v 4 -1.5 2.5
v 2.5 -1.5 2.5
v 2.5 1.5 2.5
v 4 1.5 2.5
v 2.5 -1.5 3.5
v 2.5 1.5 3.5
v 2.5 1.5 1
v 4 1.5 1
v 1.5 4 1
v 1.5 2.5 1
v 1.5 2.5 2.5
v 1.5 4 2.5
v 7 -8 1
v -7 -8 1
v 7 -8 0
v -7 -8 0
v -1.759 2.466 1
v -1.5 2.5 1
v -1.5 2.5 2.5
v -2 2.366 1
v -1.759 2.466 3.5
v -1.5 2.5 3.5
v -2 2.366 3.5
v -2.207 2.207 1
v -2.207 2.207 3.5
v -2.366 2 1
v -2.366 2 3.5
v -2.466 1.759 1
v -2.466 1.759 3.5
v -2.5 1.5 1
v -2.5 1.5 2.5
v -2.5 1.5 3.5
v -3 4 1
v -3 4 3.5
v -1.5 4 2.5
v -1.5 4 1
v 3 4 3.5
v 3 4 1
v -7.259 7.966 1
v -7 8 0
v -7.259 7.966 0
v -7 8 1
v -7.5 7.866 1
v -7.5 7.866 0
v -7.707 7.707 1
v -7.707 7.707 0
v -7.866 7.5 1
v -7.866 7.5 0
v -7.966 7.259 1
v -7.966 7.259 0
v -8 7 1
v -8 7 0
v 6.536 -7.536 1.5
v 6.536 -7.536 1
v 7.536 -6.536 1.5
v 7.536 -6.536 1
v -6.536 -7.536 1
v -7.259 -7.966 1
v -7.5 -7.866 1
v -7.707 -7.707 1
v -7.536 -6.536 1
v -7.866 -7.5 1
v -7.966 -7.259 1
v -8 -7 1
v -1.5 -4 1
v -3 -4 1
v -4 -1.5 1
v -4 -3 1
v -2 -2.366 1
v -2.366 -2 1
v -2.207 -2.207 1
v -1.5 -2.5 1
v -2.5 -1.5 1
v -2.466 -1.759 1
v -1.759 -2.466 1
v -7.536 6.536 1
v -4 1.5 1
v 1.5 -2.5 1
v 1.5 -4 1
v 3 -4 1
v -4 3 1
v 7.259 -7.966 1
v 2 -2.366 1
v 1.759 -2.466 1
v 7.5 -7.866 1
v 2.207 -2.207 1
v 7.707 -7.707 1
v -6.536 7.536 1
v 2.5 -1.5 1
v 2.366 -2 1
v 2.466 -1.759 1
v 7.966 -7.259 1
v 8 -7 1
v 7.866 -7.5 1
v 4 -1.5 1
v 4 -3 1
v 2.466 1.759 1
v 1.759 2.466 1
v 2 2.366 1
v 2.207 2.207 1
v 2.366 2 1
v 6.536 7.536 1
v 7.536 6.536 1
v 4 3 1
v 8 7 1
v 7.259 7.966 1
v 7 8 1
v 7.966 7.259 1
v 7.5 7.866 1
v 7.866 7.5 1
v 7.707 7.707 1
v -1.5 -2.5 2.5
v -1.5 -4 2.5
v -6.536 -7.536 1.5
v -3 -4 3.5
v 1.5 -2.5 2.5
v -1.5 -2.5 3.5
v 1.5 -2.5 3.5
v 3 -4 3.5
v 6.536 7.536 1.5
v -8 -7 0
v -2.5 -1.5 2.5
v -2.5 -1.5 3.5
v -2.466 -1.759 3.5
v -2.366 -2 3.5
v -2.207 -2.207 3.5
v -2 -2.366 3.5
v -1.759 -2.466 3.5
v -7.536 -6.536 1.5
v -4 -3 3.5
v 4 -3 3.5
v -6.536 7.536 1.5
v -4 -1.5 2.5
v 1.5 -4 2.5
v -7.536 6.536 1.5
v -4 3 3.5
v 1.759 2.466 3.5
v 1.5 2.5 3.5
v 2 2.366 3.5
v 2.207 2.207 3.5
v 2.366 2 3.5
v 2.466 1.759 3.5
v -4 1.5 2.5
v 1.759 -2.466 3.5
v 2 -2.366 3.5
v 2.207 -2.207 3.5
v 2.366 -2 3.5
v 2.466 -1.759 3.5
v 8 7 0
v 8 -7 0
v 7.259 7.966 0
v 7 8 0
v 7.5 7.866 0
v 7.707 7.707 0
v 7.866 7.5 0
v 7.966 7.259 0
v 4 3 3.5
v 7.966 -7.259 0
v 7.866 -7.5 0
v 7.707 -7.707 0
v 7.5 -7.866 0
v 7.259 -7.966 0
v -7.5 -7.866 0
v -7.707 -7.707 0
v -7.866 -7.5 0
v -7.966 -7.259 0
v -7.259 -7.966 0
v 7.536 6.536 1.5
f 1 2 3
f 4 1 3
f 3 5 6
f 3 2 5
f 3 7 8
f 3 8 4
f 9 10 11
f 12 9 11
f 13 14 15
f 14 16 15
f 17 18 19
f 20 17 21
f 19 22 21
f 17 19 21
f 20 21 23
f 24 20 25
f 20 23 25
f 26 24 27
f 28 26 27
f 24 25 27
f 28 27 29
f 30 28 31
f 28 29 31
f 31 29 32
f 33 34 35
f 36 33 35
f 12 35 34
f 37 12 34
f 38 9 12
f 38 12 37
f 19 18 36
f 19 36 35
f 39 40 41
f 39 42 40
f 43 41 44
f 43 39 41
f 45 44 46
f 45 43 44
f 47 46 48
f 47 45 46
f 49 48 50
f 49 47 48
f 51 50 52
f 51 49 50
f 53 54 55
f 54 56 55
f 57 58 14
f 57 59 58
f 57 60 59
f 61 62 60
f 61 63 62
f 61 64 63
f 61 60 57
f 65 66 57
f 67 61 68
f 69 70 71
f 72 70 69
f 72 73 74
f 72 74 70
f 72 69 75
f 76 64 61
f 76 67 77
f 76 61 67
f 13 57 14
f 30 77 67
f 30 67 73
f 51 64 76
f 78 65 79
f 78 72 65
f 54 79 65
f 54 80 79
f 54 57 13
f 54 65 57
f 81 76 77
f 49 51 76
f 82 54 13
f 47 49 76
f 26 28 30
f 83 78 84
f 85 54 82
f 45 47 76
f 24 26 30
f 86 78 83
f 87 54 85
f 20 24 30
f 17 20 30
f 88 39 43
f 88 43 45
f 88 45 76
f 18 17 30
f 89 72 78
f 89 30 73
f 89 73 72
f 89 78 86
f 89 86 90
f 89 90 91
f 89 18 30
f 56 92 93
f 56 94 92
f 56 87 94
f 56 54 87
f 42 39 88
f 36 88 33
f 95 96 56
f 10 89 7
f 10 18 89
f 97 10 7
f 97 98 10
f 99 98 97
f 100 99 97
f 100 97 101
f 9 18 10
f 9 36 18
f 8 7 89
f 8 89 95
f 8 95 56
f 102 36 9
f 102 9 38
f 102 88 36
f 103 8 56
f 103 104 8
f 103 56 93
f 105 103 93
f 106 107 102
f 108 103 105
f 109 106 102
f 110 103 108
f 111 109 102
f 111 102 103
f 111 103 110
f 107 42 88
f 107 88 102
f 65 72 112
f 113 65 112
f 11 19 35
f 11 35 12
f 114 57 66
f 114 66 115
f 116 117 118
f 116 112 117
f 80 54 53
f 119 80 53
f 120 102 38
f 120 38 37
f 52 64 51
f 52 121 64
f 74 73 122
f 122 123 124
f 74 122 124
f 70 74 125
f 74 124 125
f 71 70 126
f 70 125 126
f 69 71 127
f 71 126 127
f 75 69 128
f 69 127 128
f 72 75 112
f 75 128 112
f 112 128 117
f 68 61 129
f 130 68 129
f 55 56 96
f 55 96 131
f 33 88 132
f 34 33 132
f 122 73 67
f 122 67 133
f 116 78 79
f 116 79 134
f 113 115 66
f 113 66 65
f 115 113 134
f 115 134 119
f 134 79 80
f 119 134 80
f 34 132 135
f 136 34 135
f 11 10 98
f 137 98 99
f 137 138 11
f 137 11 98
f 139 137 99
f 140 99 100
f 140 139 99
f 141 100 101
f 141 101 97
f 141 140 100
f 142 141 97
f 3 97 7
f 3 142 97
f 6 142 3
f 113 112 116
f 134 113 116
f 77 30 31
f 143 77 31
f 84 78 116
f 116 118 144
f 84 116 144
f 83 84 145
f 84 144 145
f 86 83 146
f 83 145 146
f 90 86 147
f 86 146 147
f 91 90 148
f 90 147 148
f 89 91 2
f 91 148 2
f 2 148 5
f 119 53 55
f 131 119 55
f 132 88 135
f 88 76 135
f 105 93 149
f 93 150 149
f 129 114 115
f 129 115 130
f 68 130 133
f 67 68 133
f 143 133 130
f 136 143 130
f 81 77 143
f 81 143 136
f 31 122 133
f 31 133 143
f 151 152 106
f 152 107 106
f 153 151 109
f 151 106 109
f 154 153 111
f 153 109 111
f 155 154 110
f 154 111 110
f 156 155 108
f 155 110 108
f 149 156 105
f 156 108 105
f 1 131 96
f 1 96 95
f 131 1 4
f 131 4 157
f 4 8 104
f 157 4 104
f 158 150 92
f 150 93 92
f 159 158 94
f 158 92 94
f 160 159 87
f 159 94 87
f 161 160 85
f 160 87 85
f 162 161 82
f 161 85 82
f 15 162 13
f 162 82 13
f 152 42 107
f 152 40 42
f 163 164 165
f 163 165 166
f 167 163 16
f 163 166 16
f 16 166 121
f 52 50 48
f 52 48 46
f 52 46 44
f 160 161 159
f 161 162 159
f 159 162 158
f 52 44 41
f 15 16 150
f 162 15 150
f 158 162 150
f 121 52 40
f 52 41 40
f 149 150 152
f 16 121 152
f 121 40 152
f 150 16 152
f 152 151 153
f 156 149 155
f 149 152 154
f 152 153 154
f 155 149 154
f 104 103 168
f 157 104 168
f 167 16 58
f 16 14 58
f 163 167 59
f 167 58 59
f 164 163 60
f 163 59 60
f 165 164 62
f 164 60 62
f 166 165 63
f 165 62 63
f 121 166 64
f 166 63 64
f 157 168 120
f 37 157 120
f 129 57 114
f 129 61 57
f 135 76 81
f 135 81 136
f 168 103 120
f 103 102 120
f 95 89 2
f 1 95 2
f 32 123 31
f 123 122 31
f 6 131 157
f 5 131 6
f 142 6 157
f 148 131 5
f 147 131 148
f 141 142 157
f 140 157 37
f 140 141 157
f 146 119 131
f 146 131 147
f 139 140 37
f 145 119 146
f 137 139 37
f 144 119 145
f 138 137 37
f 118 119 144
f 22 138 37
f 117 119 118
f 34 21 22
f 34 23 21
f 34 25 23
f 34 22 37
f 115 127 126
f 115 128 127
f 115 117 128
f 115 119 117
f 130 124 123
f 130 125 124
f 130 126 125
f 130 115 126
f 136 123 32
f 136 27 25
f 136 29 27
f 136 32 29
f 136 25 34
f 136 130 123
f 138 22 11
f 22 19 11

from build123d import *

# Parameters (mm, degrees)
F0_W           = 16
F0_H           = 16
F1_DEPTH       = 1
F2_W           = 8
F2_H           = 8
F2_W_2         = 5
F2_H_2         = 5
F3_DEPTH       = 2.5
F4_SIZE        = 1
F5_DEPTH       = 5
F6_DEPTH       = 5
F7_DEPTH       = 5
F8_DEPTH       = 5
F9_SIZE2       = 2
F9_SIZE        = 5
F10_W          = 3
F10_H          = 1.5
F11_DEPTH      = 8.001
F11_DEPTH_BACK = 8.001
F12_W          = 3
F12_H          = 1.5
F13_DEPTH      = 8.001
F13_DEPTH_BACK = 8.001
F14_R          = 1


with BuildPart() as f1:
    # F0 (on Top) → F1 (new body)
    with BuildSketch(Plane.XY):
        Rectangle(F0_W, F0_H)
    extrude(amount=F1_DEPTH)

    # F2 (on face) → F3 (join)
    with BuildSketch(Plane.XY.offset(1)):
        Rectangle(F2_W, F2_H)
        Rectangle(F2_W_2, F2_H_2, mode=Mode.SUBTRACT)
    extrude(amount=F3_DEPTH)

    # F4
    f4_edges = [f1.edges().sort_by_distance(p)[0] for p in [
        (4, 4, 2.25),
        (-4, 4, 2.25),
        (-4, -4, 2.25),
        (4, -4, 2.25),
    ]]
    chamfer(f4_edges, length=F4_SIZE)

    # F5 (add): a face of the model
    f5_faces = [f1.faces().sort_by_distance(p)[0] for p in [
        (-3.5, -3.5, 2.25),
    ]]
    extrude(f5_faces, amount=F5_DEPTH)

    # F6 (add): a face of the model
    f6_faces = [f1.faces().sort_by_distance(p)[0] for p in [
        (3.5, -3.5, 2.25),
    ]]
    extrude(f6_faces, amount=F6_DEPTH)

    # F7 (add): a face of the model
    f7_faces = [f1.faces().sort_by_distance(p)[0] for p in [
        (-3.5, 3.5, 2.25),
    ]]
    extrude(f7_faces, amount=F7_DEPTH)

    # F8 (add): a face of the model
    f8_faces = [f1.faces().sort_by_distance(p)[0] for p in [
        (3.5, 3.5, 2.25),
    ]]
    extrude(f8_faces, amount=F8_DEPTH)

    # F9
    f9_edges = [f1.edges().sort_by_distance(p)[0] for p in [
        (-7.035534, 7.035534, 3.5),
        (-7.035534, -7.035534, 3.5),
        (7.035534, -7.035534, 3.5),
        (7.035534, 7.035534, 3.5),
    ]]
    f9_side = f1.faces().sort_by_distance((0, 3.786863, 3.5))[0]
    chamfer(f9_edges, length=F9_SIZE, length2=F9_SIZE2, reference=f9_side)

    # F10 (on Front) → F11 (cut, two sides)
    with BuildSketch(Plane.XZ) as f11_sk:
        with Locations((0, 1.75)):
            Rectangle(F10_W, F10_H)
    extrude(amount=-F11_DEPTH, mode=Mode.SUBTRACT)
    extrude(f11_sk.sketch, amount=F11_DEPTH_BACK, mode=Mode.SUBTRACT)

    # F12 (on Right) → F13 (cut, two sides)
    with BuildSketch(Plane.YZ) as f13_sk:
        with Locations((0, 1.75)):
            Rectangle(F12_W, F12_H)
    extrude(amount=-F13_DEPTH, mode=Mode.SUBTRACT)
    extrude(f13_sk.sketch, amount=F13_DEPTH_BACK, mode=Mode.SUBTRACT)

    # F14
    f14_edges = [f1.edges().sort_by_distance(p)[0] for p in [
        (-2.5, 2.5, 2.25),
        (-2.5, -2.5, 2.25),
        (2.5, 2.5, 2.25),
        (2.5, -2.5, 2.25),
        (8, -8, 0.5),
        (8, 8, 0.5),
        (-8, -8, 0.5),
        (-8, 8, 0.5),
    ]]
    fillet(f14_edges, radius=F14_R)


solid = f1.part
